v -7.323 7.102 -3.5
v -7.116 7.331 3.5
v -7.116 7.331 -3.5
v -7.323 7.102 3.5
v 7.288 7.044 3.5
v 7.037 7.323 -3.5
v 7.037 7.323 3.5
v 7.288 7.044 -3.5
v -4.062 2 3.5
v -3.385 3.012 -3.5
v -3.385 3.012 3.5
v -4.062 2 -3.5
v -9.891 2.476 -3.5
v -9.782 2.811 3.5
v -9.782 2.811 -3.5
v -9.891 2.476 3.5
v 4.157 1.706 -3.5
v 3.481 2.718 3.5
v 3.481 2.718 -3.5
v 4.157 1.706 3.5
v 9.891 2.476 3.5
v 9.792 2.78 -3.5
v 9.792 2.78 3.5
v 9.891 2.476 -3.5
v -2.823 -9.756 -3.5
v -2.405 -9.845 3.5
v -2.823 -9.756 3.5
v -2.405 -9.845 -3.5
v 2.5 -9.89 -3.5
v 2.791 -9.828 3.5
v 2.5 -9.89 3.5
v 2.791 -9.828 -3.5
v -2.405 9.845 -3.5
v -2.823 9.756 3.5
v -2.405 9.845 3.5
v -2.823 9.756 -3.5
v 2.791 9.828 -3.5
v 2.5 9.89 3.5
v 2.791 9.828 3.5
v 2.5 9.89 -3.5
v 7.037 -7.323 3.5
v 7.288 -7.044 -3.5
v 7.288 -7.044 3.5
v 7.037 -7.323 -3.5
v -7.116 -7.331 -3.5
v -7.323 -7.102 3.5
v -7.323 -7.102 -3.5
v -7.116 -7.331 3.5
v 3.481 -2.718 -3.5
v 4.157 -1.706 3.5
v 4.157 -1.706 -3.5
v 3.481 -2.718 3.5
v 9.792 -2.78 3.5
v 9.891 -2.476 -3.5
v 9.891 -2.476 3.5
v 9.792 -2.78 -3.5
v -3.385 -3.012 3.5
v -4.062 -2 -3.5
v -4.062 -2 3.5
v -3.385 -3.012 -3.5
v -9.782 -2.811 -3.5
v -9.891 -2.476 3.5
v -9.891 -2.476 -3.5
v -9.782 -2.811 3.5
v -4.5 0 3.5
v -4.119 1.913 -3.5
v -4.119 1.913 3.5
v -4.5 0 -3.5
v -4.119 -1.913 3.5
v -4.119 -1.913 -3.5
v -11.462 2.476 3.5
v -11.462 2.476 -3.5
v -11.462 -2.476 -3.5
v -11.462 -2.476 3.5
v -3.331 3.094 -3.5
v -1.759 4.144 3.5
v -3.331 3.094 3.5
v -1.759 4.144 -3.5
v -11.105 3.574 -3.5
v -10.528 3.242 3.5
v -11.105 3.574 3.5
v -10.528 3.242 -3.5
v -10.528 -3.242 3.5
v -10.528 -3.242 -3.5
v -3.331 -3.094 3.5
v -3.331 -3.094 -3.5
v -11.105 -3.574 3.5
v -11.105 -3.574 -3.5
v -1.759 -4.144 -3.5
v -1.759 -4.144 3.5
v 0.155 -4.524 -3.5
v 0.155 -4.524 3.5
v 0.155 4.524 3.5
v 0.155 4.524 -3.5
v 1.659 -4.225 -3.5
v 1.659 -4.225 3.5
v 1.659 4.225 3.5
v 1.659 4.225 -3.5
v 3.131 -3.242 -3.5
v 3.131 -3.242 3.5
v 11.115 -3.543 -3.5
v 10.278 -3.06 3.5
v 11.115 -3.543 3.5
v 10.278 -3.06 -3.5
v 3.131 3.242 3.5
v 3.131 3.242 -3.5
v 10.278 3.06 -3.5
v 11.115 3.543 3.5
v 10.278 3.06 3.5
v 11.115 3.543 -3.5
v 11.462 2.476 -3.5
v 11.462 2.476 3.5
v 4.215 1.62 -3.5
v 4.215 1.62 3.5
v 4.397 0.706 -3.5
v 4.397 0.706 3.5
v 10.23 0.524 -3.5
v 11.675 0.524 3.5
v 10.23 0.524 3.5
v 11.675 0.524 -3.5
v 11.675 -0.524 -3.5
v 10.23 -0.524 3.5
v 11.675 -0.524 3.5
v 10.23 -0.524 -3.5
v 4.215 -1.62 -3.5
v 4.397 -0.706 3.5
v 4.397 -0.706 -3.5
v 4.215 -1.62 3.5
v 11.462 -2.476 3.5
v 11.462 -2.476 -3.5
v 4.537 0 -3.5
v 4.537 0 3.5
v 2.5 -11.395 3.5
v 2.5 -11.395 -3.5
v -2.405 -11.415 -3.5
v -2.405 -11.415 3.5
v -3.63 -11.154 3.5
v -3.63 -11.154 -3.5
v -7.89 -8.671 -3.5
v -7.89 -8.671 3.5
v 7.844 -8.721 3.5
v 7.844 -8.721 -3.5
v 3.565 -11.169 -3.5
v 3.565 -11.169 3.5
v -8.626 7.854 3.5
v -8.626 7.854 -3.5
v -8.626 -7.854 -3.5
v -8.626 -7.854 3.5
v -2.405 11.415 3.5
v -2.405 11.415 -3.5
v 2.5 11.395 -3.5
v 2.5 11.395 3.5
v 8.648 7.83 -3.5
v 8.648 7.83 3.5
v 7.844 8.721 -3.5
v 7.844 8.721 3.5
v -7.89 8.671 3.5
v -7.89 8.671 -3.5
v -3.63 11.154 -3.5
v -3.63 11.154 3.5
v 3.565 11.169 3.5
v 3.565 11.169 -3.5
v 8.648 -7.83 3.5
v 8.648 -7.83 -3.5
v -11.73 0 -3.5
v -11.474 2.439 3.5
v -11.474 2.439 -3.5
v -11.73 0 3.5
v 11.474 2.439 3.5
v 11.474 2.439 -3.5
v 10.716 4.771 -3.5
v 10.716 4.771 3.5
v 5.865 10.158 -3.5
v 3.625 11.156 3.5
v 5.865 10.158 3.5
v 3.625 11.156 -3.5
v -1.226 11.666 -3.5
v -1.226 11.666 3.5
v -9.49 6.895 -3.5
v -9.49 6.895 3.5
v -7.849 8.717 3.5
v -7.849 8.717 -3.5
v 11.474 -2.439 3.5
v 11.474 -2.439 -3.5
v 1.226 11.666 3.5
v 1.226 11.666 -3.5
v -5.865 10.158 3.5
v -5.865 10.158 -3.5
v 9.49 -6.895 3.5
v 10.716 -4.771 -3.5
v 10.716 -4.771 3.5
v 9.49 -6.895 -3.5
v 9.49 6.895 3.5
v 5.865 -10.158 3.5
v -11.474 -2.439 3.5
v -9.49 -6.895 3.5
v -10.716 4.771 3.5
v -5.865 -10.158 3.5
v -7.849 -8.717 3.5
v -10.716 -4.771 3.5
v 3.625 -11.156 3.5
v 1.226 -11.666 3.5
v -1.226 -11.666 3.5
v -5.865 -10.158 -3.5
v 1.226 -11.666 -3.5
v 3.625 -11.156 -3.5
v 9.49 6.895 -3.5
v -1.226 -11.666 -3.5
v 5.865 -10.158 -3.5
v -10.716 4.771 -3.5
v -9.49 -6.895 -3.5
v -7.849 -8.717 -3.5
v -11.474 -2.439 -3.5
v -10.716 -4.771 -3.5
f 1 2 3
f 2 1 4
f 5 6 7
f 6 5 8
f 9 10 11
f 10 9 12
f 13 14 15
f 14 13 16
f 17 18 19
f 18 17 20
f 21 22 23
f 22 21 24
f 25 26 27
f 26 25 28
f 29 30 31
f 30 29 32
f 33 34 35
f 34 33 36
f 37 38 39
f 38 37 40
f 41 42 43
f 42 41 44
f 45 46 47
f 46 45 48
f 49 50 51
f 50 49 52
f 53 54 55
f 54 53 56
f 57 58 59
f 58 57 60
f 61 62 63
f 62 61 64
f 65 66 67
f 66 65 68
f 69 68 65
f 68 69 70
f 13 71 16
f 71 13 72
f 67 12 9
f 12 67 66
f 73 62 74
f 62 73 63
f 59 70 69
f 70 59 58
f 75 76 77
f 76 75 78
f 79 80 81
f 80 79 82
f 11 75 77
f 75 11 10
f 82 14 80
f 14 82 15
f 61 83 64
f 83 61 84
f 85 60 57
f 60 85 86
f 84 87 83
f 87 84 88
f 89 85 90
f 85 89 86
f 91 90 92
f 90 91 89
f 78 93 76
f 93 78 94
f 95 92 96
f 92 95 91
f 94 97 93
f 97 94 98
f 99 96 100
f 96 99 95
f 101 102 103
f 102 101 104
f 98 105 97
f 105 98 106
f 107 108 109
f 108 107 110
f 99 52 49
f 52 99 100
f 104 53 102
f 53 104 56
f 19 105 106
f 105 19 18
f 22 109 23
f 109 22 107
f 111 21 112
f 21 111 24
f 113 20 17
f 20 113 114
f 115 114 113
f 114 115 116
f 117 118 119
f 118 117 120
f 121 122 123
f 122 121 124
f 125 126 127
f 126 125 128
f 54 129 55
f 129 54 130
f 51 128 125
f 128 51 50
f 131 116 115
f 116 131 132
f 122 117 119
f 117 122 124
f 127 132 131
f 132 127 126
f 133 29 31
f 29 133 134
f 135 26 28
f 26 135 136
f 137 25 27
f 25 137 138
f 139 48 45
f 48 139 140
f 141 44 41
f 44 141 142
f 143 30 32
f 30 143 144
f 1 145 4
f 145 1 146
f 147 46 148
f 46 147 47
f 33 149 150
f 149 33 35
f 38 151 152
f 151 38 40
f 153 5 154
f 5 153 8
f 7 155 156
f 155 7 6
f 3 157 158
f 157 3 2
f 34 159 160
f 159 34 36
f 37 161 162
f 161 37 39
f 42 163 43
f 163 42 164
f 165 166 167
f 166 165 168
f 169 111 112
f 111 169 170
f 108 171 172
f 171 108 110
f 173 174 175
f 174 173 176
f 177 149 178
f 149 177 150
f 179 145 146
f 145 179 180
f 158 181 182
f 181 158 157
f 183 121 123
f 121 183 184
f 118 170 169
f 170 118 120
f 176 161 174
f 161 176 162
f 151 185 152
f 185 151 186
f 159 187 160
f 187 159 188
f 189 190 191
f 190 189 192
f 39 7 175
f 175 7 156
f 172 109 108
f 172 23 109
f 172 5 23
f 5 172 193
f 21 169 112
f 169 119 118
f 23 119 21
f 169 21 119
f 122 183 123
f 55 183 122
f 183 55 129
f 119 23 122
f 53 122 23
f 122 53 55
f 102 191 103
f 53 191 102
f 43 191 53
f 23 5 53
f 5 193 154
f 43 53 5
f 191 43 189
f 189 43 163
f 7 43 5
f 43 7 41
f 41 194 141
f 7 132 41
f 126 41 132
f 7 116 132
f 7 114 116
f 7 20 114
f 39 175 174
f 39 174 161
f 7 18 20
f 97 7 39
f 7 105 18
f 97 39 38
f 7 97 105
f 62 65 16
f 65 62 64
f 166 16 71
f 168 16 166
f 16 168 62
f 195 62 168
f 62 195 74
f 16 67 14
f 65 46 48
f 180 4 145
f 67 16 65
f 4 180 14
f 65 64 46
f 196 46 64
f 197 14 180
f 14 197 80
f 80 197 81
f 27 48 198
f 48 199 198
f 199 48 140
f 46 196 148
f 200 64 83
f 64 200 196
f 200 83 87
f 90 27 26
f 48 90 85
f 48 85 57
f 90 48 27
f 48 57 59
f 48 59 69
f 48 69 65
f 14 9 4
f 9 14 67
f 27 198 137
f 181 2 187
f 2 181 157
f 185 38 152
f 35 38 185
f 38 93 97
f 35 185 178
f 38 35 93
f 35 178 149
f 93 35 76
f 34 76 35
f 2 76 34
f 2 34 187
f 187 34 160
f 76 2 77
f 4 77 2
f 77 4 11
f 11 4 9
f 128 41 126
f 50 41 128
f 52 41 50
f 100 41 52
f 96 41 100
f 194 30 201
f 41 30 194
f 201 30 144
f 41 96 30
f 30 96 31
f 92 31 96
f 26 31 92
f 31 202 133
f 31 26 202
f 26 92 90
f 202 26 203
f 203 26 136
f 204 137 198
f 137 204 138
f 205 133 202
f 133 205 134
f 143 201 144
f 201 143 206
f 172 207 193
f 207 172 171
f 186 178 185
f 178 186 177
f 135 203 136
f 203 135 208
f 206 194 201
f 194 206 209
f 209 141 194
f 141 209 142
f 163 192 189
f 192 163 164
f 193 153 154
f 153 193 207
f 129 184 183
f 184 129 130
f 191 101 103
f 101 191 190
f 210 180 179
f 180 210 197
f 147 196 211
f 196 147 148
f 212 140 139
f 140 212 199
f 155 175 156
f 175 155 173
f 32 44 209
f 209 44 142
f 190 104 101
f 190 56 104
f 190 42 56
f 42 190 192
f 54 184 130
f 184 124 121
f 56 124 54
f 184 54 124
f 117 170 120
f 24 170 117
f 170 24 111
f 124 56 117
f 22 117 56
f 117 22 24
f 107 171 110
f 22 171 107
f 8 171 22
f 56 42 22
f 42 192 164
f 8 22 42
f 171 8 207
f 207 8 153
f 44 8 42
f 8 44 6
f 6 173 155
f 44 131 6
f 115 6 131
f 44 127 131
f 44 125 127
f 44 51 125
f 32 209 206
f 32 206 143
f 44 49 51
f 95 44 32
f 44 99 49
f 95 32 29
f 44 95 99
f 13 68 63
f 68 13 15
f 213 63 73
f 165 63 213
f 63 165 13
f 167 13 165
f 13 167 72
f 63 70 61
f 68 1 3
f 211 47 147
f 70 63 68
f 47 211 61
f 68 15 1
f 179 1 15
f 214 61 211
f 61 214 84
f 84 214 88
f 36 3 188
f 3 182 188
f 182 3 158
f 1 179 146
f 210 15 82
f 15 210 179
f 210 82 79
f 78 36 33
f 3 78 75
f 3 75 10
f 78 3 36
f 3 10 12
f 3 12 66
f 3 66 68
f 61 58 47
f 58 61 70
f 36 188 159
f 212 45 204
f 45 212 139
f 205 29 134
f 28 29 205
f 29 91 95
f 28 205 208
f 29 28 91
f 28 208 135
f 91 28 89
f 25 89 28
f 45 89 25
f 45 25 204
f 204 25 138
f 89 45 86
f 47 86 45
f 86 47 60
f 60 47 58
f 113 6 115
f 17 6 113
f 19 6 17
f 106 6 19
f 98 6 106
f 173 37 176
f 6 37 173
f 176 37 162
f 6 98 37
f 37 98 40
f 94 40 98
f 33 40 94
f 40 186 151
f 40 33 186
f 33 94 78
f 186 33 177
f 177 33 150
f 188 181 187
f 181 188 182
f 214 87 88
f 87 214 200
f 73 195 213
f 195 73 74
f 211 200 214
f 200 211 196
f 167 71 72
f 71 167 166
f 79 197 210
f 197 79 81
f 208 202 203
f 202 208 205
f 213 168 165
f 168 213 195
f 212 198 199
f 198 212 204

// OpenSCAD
// Parameters
bbox_xy = 23.46; //[11.73:46.92:0.01]
thickness = 7.0; //[3.5:14.0:0.1]
bore_d = 10.0; //[5.0:20.0:0.1]
root_od = 19.5; //[9.75:39.0:0.1]
tip_od = 23.46; //[11.73:46.92:0.01]
tooth_count = 12; //[6:48:1]
tooth_arc_width = 4.0; //[2.0:8.0:0.1]
tooth_radial_height = 1.98; //[0.99:3.96:0.01]
overlap = 0.8; //[0.5:2.0:0.1]
chamfer_z = 0.6; //[0.3:1.2:0.05]
chamfer_r = 0.6; //[0.3:1.2:0.05]
fillet_r = 0.5; //[0.25:1.0:0.05]
notch_w = 2.0; //[1.0:4.0:0.1]
notch_depth = 1.2; //[0.6:2.4:0.1]

// Base shapes
module tooth_root_outer_diameter_reference() {
  cylinder(r=root_od/2, h=thickness, center=true);
}

module tooth_tip_outer_diameter_reference() {
  cylinder(r=tip_od/2, h=thickness, center=true);
}

module center_through_bore() {
  cylinder(r=bore_d/2, h=thickness + 2*overlap, center=true);
}

module tooth_base_rect() {
  translate([(root_od/2) + ((((tip_od - root_od)/2) + overlap)/2) - overlap, 0, 0])
    cube([((tip_od - root_od)/2) + overlap, tooth_arc_width, thickness], center=true);
}

module edge_chamfer_outer_top() {
  translate([0, 0, (thickness/2) - (chamfer_z/2) + overlap])
    cylinder(r1=tip_od/2 + chamfer_r, r2=tip_od/2, h=chamfer_z, center=true);
}

module edge_chamfer_outer_bottom() {
  translate([0, 0, (-thickness/2) + (chamfer_z/2) - overlap])
    cylinder(r1=tip_od/2 + chamfer_r, r2=tip_od/2, h=chamfer_z, center=true);
}

module tooth_tip_chamfer_top() {
  translate([0, 0, (thickness/2) - (chamfer_z/2) + overlap])
    cylinder(r1=tip_od/2 + chamfer_r, r2=tip_od/2, h=chamfer_z, center=true);
}

module tooth_tip_chamfer_bottom() {
  translate([0, 0, (-thickness/2) + (chamfer_z/2) - overlap])
    cylinder(r1=tip_od/2 + chamfer_r, r2=tip_od/2, h=chamfer_z, center=true);
}

module marking_notch() {
  translate([(tip_od/2) - ((notch_depth + 2*overlap)/2) + overlap, 0, 0])
    cube([notch_depth + 2*overlap, notch_w, thickness + 2*overlap], center=true);
}

module fillet_sphere() {
  sphere(r=fillet_r);
}

// Operations
module annular_body() {
  difference() {
    tooth_root_outer_diameter_reference();
    center_through_bore();
  }
}

module outer_teeth_array() {
  union() {
    for (i = [0:tooth_count-1]) {
      rotate([0, 0, i*(360/tooth_count)])
        tooth_base_rect();
    }
  }
}

module edge_chamfers() {
  union() {
    edge_chamfer_outer_top();
    edge_chamfer_outer_bottom();
  }
}

module tooth_tip_chamfers() {
  union() {
    tooth_tip_chamfer_top();
    tooth_tip_chamfer_bottom();
  }
}

module ring_with_teeth() {
  union() {
    annular_body();
    outer_teeth_array();
  }
}

module ring_chamfered() {
  difference() {
    ring_with_teeth();
    edge_chamfers();
    tooth_tip_chamfers();
  }
}

module ring_with_notch() {
  difference() {
    ring_chamfered();
    marking_notch();
  }
}

module edge_fillets() {
  minkowski() {
    ring_with_notch();
    fillet_sphere();
  }
}

// Final model
intersection() {
  edge_fillets();
  tooth_tip_outer_diameter_reference();
}
